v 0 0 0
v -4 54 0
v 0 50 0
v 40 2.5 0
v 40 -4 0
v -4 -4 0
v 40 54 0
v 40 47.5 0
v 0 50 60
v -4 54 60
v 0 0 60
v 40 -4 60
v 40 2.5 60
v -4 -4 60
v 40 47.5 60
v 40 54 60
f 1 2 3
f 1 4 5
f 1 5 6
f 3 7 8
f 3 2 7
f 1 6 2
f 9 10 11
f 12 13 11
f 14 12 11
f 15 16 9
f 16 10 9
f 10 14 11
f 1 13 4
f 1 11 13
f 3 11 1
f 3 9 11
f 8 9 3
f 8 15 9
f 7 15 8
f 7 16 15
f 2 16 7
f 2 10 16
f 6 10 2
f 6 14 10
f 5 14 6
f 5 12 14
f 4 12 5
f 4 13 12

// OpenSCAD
// This work is licensed under a Creative Commons Attribution-ShareAlike 4.0 International License (http://creativecommons.org/licenses/by-sa/4.0/)

thickness = 4;
inner_width_begin = 50;
inner_width_end = 45;
depth = 40;
height = 60;

module __customizer_limit__() {}

thickness_delta = (inner_width_begin - inner_width_end) / 2;
linear_extrude(height=height) polygon(points=
    [
        [0, 0], [depth, thickness_delta], [depth, -thickness], [-thickness, -thickness],
        [-thickness, inner_width_begin+thickness], [depth, inner_width_begin+thickness], [depth, inner_width_begin-thickness_delta], [0, inner_width_begin] 
    ]);
